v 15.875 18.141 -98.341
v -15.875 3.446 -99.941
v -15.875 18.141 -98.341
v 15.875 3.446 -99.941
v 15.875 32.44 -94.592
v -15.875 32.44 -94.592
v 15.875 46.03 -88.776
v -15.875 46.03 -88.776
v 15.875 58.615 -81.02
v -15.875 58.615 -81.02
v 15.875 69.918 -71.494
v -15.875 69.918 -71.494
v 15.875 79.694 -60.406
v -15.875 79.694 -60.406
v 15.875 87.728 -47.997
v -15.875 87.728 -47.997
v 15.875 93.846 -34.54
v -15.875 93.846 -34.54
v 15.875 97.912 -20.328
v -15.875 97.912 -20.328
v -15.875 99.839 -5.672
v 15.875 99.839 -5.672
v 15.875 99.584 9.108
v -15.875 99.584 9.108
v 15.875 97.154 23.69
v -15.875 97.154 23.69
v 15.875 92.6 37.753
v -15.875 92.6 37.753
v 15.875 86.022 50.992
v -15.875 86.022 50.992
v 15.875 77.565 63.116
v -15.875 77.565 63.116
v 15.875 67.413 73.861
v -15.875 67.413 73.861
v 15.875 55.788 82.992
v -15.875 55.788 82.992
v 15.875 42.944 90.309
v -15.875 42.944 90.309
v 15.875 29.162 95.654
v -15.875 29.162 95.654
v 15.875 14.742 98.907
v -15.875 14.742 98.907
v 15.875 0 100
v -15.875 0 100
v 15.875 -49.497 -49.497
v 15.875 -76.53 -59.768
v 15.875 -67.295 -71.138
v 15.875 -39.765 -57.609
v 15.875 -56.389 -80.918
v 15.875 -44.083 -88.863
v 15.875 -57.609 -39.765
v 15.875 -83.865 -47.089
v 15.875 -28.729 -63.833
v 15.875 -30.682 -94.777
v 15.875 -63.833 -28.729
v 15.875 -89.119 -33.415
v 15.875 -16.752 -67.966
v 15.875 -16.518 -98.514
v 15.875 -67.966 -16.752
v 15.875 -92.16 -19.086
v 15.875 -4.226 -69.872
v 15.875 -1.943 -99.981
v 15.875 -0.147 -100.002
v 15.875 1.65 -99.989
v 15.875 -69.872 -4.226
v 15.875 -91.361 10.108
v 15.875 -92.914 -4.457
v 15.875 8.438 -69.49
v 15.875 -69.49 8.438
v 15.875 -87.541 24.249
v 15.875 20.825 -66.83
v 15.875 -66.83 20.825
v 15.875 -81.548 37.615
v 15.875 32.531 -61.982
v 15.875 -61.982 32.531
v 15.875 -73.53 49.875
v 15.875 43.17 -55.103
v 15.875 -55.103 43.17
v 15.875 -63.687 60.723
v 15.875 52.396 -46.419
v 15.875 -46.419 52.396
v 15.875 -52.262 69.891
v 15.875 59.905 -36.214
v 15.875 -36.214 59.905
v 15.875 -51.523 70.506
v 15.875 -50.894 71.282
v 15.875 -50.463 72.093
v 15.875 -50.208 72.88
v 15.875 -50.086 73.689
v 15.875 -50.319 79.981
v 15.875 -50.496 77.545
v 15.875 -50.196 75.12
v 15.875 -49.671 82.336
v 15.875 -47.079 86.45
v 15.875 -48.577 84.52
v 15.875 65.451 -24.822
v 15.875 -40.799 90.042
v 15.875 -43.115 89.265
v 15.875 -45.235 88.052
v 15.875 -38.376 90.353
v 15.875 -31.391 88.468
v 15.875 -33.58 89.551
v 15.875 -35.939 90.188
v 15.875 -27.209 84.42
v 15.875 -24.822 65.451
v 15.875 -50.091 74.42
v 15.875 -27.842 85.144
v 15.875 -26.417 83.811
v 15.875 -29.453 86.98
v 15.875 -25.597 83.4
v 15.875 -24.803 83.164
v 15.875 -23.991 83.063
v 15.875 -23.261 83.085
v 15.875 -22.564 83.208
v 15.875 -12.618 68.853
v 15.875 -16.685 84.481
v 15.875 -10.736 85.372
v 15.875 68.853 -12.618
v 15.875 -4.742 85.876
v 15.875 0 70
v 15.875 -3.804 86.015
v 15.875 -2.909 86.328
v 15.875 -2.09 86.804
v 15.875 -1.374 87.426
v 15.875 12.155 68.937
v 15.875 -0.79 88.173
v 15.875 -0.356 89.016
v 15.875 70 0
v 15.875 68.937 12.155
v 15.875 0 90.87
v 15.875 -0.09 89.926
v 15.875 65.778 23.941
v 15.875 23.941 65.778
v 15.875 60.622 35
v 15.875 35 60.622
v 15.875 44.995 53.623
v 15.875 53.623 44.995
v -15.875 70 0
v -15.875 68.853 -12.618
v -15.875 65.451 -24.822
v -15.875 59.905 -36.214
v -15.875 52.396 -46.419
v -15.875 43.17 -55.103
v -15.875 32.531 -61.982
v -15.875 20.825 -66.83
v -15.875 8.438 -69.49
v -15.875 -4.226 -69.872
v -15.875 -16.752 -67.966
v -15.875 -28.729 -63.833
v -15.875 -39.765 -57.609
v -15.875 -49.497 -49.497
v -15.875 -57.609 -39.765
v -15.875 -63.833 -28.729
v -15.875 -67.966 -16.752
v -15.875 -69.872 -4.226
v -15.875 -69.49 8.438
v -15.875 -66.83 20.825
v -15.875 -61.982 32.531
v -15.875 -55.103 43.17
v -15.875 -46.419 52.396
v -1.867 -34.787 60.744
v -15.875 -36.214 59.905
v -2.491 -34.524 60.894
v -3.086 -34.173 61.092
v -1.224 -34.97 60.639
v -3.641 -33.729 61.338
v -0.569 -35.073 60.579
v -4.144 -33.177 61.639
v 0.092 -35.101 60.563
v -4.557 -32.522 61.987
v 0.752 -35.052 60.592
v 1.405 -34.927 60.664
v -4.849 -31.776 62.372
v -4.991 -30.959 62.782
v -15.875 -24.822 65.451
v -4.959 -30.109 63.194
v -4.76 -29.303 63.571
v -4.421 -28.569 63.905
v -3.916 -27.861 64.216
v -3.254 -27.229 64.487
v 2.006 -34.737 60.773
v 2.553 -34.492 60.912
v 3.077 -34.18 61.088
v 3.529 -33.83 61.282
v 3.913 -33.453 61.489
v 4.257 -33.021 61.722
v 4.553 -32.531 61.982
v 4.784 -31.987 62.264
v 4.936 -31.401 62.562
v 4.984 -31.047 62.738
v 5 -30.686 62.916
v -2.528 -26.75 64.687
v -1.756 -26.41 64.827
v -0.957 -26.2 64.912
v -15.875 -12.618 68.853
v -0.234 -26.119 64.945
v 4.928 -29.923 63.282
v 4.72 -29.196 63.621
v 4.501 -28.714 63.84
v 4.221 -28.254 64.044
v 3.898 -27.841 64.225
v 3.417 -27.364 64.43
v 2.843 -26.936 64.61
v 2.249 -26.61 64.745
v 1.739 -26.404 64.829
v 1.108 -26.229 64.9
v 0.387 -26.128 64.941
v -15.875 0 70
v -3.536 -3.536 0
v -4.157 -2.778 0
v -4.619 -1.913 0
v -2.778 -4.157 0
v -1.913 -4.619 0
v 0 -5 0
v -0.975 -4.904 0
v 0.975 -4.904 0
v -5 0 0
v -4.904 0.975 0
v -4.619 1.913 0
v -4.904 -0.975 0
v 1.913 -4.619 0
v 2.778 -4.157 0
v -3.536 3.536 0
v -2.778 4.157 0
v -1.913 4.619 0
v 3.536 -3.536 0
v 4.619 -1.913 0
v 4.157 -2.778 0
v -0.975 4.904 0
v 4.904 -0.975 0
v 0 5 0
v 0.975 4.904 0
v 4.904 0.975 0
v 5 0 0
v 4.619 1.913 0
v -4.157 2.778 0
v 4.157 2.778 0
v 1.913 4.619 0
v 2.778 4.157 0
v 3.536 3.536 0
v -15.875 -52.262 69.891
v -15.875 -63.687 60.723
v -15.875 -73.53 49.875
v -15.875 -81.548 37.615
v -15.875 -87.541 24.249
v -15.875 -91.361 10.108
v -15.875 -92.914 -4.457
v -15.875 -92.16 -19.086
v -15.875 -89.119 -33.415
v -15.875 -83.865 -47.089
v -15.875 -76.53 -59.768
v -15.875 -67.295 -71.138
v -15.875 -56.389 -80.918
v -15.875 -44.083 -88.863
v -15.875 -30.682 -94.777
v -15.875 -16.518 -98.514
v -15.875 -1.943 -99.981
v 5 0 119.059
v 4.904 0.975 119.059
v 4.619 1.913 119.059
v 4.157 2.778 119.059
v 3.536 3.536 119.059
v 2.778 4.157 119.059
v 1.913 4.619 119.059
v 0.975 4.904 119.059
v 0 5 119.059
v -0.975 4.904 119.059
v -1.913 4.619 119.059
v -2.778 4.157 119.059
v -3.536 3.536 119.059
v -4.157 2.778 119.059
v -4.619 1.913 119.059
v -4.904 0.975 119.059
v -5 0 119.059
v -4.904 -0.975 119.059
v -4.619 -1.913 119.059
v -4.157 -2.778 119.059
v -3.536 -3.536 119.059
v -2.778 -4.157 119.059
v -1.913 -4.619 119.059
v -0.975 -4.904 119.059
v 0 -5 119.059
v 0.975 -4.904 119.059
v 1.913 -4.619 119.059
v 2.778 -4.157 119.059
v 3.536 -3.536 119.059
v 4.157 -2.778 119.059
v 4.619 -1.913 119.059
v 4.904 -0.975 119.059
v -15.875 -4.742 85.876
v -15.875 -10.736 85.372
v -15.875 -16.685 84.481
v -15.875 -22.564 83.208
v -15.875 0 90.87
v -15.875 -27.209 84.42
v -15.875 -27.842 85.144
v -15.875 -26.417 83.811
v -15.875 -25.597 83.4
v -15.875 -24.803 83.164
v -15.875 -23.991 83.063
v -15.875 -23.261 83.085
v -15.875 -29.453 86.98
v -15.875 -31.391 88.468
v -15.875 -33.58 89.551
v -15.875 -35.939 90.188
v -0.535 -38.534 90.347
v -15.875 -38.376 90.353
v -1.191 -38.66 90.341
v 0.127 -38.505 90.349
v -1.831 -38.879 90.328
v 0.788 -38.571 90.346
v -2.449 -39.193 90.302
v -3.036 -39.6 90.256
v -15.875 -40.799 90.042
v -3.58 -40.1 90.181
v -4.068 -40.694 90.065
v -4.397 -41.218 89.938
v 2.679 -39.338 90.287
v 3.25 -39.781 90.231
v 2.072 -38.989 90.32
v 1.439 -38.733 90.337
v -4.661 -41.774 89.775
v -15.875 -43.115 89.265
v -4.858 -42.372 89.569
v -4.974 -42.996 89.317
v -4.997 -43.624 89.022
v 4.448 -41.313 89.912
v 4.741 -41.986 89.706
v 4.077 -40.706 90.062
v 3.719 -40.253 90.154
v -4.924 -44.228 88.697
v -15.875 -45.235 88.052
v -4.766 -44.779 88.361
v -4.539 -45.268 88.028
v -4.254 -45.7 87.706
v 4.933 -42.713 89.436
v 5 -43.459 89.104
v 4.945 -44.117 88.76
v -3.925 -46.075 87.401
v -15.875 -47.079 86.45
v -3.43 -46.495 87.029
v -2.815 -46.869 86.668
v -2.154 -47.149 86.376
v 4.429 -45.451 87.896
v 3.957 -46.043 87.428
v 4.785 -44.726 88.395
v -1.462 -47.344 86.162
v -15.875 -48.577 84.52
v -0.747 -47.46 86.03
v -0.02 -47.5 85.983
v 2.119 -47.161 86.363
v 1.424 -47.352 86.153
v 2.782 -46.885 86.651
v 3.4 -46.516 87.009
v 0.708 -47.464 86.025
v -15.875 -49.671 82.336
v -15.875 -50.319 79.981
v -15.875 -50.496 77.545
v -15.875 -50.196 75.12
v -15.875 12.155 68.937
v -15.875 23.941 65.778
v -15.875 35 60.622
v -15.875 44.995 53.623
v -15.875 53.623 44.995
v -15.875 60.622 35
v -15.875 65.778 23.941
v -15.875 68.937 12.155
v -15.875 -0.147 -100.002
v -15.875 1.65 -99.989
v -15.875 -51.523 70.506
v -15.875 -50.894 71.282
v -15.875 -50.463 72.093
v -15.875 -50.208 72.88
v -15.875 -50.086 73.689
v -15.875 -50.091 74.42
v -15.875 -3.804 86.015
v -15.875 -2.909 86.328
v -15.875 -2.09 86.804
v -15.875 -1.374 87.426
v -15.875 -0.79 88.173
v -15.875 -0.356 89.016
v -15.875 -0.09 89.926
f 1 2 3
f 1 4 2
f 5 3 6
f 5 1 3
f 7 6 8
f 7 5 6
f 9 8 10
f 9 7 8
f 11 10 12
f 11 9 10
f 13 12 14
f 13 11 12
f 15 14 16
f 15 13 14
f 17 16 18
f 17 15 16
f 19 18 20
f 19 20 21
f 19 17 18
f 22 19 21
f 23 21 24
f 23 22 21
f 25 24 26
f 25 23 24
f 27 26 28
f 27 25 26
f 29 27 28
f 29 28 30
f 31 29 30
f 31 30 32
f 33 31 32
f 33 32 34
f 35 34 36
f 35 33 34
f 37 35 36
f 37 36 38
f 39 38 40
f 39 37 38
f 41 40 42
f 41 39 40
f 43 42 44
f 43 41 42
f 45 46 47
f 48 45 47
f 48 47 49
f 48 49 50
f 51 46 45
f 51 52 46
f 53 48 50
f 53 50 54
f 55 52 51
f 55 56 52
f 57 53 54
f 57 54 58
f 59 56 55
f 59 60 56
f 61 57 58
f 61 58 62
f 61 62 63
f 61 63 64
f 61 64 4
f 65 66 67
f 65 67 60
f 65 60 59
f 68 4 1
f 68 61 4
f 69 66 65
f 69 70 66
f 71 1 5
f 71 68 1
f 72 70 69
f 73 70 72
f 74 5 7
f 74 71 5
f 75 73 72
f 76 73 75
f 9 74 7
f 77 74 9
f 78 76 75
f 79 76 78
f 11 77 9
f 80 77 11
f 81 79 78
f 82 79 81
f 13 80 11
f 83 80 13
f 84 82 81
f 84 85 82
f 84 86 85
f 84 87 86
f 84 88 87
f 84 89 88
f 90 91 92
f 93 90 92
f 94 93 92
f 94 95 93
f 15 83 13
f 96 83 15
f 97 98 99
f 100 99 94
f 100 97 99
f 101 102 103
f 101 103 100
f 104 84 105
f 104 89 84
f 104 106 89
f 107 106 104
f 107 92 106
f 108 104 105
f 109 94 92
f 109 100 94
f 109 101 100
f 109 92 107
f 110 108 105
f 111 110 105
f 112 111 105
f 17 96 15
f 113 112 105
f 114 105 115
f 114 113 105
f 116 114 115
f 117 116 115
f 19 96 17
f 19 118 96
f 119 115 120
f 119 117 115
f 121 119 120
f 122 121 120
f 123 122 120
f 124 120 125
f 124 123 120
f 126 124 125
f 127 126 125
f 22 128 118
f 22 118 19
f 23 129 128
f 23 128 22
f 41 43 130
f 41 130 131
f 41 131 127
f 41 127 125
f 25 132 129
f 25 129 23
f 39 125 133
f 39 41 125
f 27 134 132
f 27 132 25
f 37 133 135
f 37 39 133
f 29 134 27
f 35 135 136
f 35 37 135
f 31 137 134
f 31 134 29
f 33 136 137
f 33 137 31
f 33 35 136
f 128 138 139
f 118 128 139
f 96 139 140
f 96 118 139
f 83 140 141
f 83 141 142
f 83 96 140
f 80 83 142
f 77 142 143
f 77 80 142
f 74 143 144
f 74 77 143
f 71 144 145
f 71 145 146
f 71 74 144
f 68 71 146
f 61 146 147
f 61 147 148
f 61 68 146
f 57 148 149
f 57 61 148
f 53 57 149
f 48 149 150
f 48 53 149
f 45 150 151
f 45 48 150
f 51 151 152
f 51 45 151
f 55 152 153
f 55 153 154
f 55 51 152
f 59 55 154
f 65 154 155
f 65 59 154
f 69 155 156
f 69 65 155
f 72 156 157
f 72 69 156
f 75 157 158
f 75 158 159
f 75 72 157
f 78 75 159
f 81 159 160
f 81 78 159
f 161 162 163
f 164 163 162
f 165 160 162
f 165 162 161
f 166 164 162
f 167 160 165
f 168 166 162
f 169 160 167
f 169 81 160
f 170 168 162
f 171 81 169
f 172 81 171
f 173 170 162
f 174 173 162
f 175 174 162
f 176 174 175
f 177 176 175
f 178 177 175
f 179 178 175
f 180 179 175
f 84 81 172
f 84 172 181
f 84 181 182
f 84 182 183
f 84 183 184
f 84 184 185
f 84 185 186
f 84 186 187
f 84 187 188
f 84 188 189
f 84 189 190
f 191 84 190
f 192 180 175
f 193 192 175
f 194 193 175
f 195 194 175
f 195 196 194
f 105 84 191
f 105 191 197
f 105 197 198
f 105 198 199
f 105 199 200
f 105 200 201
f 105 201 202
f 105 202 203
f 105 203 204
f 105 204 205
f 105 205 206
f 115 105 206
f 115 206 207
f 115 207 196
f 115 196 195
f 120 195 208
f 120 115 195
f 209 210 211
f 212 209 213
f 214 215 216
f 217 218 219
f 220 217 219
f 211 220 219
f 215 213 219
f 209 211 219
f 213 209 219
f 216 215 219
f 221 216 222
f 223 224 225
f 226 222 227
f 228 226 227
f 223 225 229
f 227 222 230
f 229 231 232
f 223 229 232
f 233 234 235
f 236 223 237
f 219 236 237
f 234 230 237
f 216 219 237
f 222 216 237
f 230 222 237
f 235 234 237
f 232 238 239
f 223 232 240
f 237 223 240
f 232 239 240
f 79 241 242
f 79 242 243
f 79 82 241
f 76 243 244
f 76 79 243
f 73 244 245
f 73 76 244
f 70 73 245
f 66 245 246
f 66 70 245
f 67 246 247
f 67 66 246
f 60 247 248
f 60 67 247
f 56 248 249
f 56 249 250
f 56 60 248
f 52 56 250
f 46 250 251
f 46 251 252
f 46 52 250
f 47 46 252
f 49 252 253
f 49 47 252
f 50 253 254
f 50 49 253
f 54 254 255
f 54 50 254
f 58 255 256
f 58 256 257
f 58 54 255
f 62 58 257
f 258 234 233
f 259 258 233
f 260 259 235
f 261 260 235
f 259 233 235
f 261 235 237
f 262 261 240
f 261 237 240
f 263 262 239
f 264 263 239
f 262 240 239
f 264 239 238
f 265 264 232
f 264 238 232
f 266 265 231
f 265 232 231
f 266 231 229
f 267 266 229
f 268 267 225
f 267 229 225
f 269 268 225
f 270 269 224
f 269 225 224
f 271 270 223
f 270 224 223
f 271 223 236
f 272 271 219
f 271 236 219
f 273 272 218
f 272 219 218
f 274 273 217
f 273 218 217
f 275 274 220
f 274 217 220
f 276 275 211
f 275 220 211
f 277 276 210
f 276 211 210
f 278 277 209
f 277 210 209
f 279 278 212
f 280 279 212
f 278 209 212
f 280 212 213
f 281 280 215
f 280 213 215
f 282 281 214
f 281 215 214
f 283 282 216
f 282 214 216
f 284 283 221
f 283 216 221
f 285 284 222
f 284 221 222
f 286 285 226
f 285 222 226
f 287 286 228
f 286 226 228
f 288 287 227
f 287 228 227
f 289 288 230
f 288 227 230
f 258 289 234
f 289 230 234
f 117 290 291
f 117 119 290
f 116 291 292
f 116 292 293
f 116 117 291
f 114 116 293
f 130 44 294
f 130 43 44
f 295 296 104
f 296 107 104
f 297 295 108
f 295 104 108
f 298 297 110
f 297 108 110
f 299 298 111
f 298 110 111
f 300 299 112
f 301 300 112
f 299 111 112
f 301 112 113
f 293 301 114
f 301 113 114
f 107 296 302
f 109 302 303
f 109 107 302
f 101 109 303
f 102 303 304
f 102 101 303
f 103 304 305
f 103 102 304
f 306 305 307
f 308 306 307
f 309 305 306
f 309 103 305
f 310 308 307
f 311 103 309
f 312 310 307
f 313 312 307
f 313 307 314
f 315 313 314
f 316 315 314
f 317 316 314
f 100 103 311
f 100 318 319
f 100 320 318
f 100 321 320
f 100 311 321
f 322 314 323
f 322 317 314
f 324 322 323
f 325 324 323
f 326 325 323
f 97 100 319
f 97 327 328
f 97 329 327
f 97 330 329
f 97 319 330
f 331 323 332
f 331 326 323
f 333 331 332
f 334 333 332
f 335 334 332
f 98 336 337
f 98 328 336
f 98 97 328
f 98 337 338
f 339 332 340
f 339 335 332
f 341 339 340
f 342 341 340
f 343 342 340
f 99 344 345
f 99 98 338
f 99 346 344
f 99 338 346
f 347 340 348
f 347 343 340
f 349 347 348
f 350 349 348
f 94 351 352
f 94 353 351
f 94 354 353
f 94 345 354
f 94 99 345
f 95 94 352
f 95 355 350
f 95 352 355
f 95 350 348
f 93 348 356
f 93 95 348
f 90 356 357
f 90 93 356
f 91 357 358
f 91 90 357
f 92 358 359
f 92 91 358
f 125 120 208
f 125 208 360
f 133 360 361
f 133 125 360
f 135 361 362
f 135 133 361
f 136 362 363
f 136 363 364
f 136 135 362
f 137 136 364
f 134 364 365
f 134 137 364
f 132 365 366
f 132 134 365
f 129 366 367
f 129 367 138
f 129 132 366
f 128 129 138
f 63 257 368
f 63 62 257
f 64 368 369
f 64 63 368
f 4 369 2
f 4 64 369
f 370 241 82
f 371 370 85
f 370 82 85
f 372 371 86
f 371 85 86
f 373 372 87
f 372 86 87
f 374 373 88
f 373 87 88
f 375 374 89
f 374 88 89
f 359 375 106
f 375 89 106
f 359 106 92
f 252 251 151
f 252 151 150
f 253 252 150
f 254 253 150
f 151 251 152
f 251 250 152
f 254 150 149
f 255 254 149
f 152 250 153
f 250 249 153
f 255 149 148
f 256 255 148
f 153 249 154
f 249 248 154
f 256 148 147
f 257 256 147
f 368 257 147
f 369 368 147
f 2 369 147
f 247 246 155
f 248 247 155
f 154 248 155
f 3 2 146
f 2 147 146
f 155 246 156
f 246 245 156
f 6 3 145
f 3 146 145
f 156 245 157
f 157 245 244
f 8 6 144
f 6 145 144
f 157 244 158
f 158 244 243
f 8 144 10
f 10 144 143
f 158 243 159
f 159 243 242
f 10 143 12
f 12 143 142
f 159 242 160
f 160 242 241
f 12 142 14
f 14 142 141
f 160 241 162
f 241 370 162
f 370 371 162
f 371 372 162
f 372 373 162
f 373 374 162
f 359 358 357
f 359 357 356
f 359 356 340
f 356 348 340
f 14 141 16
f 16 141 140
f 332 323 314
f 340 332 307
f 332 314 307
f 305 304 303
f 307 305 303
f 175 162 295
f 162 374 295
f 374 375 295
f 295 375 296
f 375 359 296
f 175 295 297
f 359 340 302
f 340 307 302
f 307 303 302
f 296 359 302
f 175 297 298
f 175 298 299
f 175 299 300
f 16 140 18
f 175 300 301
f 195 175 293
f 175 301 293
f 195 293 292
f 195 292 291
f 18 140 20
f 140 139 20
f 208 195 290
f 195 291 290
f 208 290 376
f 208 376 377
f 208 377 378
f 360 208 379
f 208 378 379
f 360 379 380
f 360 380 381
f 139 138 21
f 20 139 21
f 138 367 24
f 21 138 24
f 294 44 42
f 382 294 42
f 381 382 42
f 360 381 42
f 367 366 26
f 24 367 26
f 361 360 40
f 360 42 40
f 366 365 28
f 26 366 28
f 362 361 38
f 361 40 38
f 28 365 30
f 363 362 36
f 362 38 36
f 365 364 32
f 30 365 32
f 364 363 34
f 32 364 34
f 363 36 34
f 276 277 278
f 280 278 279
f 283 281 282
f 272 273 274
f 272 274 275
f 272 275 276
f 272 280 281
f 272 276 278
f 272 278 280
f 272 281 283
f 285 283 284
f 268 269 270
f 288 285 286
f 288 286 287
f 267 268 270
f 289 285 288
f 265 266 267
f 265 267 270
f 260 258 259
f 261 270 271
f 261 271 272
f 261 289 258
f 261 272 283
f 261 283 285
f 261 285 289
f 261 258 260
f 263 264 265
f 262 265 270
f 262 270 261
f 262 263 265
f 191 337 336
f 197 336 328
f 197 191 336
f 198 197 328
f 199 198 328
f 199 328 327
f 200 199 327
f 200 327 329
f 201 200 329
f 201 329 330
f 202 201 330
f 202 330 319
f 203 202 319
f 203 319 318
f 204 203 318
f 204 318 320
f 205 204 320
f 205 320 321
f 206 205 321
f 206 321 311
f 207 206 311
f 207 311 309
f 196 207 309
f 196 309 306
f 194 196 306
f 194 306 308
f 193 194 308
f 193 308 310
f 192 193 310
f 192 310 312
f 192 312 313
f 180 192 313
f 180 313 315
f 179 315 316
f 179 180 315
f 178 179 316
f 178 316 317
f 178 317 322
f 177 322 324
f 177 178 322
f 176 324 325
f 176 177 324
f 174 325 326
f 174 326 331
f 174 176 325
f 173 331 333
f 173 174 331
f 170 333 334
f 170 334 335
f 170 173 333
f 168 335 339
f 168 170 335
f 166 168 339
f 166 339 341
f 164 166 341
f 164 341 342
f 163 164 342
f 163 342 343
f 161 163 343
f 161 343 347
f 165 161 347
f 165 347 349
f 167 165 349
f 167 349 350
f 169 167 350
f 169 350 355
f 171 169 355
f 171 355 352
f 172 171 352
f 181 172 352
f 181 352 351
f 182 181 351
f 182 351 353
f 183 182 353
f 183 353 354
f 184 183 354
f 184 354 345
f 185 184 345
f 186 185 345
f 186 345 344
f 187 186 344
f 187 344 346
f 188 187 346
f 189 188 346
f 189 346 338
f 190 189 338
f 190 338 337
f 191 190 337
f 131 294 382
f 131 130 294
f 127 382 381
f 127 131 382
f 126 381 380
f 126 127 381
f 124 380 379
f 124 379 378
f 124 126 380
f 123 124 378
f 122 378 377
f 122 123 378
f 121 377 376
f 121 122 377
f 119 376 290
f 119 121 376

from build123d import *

# Parameters (mm, degrees)
F1_DEPTH = 15.875
F2_R     = 5
F3_R     = 5
F4_DEPTH = 119.05865
F6_COUNT = 2
F6_ANGLE = 26


with BuildPart() as f1:
    # F0 (on Right) → F1 (new body, symmetric)
    with BuildSketch(Plane.YZ):
        with BuildLine():
            ThreePointArc((0, 70), (-49.497475, -49.497475), (70, 0))
            ThreePointArc((70, 0), (49.497475, 49.497475), (0, 70))
        make_face()
        with BuildLine():
            Line((0, 100), (0, 85.999985))
            ThreePointArc((0, 85.999985), (-13.274622, 85.04014), (-26.276301, 82.195282))
            ThreePointArc((-26.276301, 82.195282), (-43.114528, 89.264593), (-49.036272, 71.98935))
            ThreePointArc((-49.036272, 71.98935), (-89.646202, -31.564643), (-1.943395, -99.981114))
            ThreePointArc((-1.943395, -99.981114), (0.751375, -99.997177), (3.445599, -99.940622))
            ThreePointArc((3.445599, -99.940622), (99.985154, 1.723055), (0, 100))
        make_face()
        with BuildLine():
            ThreePointArc((0, 70), (49.497475, 49.497475), (70, 0))
            ThreePointArc((70, 0), (-49.497475, -49.497475), (0, 70))
        make_face(mode=Mode.SUBTRACT)
        with BuildLine():
            ThreePointArc((-1.943395, -99.981114), (0.751396, -99.999911), (3.445599, -99.940622))
            ThreePointArc((3.445599, -99.940622), (0.751375, -99.997177), (-1.943395, -99.981114))
        make_face()
    extrude(amount=F1_DEPTH, both=True)

    # F2
    f2_edges = [f1.edges().sort_by_distance(p)[0] for p in [
        (0, -26.276301, 82.195282),
        (0, -49.036272, 71.98935),
        (0, 0, 85.999985),
    ]]
    fillet(f2_edges, radius=F2_R)


with BuildPart() as f4:
    # F3 (on Top) → F4 (new body)
    with BuildSketch(Plane.XY):
        Circle(F3_R)
    extrude(amount=F4_DEPTH)


with BuildPart() as f6_1:
    # F6: instance of F4
    add(f4.part.rotate(Axis((7.795472, 0, 0), (1, 0, 0)), 1 * F6_ANGLE / (F6_COUNT - 1)))


with BuildPart() as f1_1:
    add(f1.part)

    # F7: cut F6_1
    add(f6_1.part, mode=Mode.SUBTRACT)


solid = Compound([f4.part, f1_1.part])
